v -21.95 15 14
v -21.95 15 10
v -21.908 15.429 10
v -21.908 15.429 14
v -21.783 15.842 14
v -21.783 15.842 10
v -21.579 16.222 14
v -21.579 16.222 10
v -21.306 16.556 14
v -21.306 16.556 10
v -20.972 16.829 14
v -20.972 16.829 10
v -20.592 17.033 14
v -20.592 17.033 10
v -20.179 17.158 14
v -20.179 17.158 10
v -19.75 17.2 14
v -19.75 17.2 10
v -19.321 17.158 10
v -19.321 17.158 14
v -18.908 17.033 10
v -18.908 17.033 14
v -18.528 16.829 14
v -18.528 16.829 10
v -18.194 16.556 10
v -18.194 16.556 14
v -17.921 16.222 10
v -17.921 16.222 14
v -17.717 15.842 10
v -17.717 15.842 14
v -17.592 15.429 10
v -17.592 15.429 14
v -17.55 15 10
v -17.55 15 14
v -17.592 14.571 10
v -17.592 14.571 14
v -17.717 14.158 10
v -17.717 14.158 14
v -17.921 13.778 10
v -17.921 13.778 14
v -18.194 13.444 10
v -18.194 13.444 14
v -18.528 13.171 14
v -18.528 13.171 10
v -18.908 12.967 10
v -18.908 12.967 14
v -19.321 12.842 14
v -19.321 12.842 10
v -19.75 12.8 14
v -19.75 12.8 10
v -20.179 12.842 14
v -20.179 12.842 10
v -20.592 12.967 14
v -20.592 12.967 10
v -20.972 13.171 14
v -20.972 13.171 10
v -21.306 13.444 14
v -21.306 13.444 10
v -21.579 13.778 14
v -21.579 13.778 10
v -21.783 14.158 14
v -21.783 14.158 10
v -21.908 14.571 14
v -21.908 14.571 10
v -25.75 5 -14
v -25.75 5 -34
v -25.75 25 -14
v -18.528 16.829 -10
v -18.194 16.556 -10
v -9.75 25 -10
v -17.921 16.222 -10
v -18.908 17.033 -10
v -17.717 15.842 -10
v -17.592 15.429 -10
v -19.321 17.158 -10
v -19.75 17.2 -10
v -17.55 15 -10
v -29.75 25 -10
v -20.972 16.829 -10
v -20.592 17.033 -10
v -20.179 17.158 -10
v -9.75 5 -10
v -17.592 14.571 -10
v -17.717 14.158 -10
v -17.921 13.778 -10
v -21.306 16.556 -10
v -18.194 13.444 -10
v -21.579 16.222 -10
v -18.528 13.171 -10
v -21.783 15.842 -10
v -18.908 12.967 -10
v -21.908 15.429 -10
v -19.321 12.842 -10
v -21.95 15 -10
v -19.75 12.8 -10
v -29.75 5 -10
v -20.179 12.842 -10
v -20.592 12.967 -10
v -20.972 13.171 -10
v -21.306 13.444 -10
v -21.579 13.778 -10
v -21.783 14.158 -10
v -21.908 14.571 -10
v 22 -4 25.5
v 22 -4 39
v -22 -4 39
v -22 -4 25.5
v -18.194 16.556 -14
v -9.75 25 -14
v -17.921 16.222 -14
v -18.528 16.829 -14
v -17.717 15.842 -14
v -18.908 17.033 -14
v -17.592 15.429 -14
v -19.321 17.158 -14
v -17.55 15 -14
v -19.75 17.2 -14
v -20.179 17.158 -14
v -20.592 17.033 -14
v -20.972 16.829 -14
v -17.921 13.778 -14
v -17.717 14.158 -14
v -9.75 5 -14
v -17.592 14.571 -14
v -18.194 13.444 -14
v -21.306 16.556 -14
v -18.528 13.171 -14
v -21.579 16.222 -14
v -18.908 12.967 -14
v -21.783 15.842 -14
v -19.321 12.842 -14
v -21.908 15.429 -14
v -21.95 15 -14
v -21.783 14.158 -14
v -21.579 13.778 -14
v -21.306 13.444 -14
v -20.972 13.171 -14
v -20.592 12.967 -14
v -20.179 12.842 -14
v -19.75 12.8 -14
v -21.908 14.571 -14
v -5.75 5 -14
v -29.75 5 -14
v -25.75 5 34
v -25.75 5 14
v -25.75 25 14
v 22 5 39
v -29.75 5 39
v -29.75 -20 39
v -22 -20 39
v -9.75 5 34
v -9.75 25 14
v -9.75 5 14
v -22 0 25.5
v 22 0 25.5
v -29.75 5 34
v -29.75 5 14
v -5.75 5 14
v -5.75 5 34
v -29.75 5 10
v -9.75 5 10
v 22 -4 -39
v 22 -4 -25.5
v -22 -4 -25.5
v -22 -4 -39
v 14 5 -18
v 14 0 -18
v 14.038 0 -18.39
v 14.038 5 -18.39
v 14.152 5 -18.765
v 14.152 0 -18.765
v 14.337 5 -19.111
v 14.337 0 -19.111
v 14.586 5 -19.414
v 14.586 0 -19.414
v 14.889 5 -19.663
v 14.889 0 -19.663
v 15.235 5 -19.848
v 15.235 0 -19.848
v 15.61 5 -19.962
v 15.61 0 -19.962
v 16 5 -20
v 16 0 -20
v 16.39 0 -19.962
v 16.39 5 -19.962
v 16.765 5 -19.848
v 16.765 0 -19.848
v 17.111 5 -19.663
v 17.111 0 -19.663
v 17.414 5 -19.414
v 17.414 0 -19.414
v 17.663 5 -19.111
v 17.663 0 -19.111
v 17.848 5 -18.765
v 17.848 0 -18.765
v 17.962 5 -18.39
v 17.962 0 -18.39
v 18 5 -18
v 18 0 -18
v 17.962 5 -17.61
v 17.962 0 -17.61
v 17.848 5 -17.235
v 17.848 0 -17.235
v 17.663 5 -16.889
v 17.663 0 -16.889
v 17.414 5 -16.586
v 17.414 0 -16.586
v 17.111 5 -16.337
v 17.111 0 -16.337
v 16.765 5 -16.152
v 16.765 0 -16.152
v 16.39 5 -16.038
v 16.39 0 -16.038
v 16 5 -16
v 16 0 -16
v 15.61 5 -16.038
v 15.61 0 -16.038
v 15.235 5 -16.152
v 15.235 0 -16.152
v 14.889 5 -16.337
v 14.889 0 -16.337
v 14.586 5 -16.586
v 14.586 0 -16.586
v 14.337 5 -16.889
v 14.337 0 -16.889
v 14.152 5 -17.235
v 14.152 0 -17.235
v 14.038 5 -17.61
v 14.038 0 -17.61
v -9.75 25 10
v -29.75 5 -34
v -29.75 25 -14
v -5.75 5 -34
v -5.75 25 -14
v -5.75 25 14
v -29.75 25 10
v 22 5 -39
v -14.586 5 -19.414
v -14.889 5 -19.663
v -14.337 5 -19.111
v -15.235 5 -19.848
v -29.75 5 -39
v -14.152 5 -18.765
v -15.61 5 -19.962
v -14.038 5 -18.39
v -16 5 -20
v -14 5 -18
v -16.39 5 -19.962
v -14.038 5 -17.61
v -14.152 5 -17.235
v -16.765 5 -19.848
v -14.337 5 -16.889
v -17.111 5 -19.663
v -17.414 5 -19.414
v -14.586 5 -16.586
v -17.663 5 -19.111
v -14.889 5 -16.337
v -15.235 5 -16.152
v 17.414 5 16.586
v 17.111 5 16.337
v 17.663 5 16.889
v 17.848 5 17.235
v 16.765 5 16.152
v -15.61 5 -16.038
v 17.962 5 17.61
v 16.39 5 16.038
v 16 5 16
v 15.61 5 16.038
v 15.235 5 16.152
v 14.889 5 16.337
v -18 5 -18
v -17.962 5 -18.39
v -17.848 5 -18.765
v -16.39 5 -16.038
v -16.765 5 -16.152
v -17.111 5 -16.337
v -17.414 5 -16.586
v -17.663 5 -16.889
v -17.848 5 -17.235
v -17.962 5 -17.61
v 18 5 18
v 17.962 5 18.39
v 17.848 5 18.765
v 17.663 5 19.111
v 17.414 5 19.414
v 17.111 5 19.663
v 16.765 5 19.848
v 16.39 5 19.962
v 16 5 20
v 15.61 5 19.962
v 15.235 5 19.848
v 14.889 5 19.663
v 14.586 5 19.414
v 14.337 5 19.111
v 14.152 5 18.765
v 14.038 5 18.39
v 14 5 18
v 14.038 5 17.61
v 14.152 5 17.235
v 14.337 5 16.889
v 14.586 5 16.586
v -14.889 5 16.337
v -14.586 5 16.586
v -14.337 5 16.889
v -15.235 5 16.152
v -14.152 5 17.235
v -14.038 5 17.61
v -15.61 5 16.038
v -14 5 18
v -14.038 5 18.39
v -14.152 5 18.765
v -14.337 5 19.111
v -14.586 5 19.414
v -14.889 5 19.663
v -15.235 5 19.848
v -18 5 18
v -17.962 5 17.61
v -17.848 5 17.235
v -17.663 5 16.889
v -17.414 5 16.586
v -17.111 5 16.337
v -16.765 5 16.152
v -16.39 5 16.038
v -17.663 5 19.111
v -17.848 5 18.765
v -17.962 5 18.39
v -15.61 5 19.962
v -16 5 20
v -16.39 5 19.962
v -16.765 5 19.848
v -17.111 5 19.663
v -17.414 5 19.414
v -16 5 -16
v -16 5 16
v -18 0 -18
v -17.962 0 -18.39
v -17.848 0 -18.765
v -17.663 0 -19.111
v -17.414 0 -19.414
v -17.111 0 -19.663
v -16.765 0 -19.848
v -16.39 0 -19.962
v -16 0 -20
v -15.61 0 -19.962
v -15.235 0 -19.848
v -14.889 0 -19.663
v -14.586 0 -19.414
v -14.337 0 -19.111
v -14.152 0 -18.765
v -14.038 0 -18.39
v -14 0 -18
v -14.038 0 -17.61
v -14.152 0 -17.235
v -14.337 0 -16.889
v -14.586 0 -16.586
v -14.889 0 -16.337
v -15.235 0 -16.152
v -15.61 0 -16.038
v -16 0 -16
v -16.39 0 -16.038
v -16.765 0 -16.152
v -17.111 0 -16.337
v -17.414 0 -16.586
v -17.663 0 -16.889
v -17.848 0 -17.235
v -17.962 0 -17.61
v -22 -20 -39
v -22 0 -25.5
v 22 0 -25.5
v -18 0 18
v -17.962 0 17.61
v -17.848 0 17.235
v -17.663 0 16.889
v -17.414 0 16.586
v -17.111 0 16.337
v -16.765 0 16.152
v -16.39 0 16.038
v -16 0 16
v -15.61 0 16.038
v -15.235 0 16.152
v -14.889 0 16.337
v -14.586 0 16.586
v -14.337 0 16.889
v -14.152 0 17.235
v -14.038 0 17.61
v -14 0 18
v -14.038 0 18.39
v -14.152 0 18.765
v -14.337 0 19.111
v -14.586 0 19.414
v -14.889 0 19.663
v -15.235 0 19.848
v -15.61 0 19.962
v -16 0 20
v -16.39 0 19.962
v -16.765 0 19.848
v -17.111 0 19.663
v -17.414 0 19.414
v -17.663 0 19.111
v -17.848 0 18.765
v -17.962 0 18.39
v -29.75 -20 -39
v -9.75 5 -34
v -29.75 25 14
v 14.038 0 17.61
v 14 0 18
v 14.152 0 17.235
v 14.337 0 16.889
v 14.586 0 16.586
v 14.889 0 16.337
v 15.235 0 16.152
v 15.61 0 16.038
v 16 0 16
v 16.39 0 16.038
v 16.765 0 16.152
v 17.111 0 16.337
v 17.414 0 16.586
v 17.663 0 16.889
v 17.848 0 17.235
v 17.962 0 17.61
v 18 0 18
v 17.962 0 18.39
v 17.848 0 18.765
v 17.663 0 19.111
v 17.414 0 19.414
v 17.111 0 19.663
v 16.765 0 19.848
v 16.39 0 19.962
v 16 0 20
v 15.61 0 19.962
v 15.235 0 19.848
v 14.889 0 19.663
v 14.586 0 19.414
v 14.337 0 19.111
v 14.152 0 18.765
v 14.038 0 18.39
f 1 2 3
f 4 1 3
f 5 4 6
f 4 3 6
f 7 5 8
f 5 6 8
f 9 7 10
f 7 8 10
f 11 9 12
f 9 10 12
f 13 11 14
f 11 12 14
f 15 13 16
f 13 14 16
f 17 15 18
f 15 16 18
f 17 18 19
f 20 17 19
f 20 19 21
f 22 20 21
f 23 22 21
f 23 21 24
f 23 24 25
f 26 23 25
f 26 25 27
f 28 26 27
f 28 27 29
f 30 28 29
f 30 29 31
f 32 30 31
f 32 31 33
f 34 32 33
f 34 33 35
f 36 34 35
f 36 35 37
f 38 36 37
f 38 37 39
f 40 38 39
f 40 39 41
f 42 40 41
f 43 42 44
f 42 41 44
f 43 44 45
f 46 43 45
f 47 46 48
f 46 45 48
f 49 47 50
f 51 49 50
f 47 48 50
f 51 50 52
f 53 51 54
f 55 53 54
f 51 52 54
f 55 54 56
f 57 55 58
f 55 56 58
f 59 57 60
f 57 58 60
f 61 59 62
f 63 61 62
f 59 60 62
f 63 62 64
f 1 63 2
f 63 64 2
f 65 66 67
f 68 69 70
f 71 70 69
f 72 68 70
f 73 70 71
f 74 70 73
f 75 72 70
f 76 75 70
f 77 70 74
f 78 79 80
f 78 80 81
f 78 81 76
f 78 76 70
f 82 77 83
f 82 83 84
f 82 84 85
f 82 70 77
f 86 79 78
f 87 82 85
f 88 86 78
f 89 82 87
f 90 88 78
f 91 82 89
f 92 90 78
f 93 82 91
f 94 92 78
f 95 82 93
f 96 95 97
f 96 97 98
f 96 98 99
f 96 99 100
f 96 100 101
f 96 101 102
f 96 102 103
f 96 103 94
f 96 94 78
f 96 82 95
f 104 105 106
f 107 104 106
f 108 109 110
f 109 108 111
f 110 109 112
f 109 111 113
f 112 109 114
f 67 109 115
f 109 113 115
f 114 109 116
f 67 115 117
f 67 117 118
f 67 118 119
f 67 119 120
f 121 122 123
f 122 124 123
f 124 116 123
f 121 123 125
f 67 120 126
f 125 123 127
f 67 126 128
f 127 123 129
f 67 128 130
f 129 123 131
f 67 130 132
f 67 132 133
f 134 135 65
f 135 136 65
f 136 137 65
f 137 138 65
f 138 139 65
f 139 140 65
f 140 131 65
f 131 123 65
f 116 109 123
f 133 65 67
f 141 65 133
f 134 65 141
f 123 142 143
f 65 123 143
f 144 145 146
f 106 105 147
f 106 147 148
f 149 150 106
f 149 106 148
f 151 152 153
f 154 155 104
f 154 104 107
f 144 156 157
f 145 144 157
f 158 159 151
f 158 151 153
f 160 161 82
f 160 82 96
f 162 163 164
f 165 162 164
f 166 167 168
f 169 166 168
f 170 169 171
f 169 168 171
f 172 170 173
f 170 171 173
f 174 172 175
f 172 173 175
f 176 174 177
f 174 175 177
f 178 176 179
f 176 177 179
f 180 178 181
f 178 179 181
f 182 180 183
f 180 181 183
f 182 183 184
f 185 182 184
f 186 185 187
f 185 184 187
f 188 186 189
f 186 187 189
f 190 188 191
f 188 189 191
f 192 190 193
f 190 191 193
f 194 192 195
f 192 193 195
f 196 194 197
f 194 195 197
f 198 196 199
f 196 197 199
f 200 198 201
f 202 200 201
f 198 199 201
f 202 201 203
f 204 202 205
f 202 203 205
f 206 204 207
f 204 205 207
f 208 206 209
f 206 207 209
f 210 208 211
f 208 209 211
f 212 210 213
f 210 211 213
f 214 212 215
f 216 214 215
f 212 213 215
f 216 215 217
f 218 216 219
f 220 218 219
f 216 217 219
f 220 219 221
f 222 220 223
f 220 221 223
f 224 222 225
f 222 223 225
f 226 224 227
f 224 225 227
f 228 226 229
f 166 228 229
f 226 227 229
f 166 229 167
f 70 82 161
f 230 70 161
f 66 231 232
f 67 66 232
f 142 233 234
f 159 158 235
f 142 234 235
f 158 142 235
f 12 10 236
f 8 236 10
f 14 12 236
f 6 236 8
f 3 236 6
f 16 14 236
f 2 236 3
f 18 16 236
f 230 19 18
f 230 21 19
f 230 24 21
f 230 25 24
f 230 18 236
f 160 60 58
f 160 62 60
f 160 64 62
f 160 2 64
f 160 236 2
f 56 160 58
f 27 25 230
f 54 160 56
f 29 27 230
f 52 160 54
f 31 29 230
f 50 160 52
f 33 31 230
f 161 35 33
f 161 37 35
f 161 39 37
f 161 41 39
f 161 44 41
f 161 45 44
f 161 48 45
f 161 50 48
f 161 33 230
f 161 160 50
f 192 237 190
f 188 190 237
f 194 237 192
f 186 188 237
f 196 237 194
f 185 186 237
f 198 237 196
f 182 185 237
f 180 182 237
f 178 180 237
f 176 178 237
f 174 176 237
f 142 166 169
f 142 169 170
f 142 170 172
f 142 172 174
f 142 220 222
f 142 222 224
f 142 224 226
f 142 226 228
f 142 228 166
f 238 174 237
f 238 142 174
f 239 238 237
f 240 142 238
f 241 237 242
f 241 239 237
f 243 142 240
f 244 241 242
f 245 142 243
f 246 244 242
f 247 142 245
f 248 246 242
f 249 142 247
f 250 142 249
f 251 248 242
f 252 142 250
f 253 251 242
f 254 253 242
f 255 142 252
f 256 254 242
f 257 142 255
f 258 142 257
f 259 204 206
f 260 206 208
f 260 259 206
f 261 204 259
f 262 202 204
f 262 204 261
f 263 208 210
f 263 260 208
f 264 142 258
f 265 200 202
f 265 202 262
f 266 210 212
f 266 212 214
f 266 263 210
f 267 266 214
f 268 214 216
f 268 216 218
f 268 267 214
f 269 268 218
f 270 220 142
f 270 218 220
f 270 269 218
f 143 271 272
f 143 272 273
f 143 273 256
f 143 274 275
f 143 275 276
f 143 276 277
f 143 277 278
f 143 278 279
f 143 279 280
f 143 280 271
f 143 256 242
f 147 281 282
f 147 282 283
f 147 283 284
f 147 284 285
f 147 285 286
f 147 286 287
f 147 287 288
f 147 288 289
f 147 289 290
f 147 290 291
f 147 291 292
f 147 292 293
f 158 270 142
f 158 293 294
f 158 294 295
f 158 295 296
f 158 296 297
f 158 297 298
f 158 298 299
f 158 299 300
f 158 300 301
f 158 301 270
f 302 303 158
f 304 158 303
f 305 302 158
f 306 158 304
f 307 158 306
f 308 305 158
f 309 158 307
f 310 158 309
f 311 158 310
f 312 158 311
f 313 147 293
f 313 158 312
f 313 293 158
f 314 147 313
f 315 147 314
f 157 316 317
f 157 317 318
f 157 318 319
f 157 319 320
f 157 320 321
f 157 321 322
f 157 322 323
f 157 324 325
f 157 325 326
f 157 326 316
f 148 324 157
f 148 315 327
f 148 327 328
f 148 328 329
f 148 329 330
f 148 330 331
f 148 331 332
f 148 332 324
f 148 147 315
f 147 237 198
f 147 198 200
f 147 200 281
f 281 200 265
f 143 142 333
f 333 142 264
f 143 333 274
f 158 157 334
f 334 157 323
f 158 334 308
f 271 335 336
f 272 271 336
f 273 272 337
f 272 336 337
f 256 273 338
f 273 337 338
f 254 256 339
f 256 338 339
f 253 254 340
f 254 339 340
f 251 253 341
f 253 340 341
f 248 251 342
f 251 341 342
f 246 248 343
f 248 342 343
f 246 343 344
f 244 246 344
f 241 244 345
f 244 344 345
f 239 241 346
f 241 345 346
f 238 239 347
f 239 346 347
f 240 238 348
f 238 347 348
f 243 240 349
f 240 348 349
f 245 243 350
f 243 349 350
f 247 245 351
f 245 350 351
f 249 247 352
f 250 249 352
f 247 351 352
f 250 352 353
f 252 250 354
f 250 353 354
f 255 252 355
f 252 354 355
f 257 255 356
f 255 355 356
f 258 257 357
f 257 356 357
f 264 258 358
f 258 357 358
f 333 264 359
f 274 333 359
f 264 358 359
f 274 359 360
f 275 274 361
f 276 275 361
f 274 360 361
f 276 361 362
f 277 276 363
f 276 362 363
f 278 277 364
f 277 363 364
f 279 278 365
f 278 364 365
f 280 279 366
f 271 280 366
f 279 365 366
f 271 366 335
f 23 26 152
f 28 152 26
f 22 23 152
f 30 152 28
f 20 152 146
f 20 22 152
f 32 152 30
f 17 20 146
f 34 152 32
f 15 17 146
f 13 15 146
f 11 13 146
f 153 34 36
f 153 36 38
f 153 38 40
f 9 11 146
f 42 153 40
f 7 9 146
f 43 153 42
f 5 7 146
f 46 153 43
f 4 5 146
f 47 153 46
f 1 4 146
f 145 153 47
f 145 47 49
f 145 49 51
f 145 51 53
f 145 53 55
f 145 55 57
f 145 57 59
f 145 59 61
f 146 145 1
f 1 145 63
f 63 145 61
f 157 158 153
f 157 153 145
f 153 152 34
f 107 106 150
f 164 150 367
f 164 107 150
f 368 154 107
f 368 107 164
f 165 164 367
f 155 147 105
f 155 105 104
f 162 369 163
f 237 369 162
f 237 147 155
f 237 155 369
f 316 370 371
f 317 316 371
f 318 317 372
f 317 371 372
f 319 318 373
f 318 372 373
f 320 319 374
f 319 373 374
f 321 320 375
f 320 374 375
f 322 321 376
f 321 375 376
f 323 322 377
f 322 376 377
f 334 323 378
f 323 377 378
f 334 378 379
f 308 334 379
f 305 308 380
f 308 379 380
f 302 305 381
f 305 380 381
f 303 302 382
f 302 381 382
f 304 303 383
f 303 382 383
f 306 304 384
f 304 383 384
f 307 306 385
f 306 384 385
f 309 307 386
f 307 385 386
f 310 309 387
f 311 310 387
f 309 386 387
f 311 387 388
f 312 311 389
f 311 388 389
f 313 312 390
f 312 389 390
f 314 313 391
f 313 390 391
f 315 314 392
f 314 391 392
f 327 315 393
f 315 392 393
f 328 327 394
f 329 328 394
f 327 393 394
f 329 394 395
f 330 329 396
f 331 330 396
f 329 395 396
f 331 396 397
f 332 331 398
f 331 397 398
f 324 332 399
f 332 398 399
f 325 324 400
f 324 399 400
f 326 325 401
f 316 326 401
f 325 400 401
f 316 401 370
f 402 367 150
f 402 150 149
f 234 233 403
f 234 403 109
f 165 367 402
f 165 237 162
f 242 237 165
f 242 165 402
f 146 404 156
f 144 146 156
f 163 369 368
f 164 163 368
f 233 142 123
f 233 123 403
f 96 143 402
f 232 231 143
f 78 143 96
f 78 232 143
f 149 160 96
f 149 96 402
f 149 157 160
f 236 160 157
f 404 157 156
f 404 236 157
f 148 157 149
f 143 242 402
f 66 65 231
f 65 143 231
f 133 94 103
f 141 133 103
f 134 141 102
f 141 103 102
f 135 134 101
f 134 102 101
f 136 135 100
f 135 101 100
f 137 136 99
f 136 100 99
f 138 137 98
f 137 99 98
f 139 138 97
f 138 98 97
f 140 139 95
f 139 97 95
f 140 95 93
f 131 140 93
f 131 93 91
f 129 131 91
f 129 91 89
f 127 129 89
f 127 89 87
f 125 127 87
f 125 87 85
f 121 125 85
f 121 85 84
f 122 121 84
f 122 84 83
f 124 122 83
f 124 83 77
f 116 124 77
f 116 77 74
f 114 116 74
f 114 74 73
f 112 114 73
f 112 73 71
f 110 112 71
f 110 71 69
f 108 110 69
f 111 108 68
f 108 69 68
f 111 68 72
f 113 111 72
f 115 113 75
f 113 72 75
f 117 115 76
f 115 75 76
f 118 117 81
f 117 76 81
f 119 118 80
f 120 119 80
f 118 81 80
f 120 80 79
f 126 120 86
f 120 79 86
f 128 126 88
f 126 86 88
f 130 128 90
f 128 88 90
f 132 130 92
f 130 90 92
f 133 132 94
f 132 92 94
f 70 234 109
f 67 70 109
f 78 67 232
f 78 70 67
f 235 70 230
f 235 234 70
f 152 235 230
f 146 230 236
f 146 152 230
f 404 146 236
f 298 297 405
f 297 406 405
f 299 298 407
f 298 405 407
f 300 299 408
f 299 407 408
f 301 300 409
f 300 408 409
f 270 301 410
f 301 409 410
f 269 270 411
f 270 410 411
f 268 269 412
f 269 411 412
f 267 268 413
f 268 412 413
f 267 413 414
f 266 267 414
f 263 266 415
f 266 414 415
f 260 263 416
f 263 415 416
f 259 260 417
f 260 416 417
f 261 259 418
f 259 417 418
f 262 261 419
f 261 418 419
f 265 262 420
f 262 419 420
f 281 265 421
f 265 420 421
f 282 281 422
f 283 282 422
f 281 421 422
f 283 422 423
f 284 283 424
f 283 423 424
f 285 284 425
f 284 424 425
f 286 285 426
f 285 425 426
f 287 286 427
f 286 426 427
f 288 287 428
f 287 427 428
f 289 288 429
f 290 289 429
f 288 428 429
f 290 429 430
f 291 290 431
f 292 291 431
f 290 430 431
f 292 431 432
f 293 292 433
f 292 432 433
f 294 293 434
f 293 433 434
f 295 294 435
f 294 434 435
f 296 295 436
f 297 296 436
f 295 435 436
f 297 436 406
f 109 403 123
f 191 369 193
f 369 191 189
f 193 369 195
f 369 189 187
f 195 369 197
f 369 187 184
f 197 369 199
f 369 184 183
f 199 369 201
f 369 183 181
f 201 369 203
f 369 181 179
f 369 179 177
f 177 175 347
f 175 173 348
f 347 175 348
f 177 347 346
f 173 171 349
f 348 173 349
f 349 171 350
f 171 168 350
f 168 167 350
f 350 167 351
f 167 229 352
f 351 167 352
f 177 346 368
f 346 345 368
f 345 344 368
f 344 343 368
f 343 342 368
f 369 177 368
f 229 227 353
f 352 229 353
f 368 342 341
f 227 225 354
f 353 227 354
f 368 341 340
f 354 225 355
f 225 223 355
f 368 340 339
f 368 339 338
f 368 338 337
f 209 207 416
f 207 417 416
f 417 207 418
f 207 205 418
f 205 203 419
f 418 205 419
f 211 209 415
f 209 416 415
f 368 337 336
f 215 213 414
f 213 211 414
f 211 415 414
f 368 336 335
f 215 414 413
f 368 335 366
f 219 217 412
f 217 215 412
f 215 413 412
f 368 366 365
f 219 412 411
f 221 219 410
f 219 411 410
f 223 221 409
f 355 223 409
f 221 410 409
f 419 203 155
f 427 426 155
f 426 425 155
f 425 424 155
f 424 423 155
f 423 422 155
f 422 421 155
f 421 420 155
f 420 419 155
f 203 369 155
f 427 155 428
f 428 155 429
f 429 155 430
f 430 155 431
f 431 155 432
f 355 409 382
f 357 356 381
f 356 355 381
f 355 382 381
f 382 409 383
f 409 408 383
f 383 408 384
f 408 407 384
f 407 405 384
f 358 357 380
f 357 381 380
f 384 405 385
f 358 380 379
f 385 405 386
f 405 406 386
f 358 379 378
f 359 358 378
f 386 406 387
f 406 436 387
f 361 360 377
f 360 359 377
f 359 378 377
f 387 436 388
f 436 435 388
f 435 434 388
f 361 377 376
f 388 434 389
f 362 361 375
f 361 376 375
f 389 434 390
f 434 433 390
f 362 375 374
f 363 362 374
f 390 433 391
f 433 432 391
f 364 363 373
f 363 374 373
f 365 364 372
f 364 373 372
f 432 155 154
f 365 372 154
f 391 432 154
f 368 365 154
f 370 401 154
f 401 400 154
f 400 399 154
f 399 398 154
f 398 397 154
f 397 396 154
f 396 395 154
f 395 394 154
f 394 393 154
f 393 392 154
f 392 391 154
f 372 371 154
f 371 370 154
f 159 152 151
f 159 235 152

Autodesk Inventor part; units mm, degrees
ref_plane "YZ Plane" through (0, 0, 0) normal (1, 0, 0) x (0, 1, 0)
ref_plane "XY Plane" through (0, 0, 0) normal (0, 0, 1) x (1, 0, 0)
sketch "Sketch1" plane through (0, 0, 0) normal (0, 1, 0) x (-1, 0, 0)
  line L0 (16, 18) -> (16, -18) construction
  circle A0 centre (16, -18) radius 2
  line L1 (16, 0) -> (0, 0) construction
  line L2 (-16, 0) -> (0, 0) construction
  line L3 (-16, 18) -> (-16, -18) construction
  circle A1 centre (-16, 18) radius 2
  circle A2 centre (-16, -18) radius 2
  line L4 (22, -25.5) -> (-22, -25.5) construction
  line L5 (-22, -25.5) -> (22, -25.5)
  line L6 (-22, -25.5) -> (-22, 25.5)
  line L7 (22, -25.5) -> (-22, 25.5) construction
  line L8 (-22, -25.5) -> (22, 25.5) construction
  circle A3 centre (16, 18) radius 2
  line L9 (-22, 25.5) -> (22, 25.5) construction
  line L10 (-22, 25.5) -> (22, 25.5)
  circle A4 centre (16, -18) radius 4
  circle A5 centre (-16, -18) radius 4
  circle A6 centre (-16, 18) radius 4
  circle A7 centre (16, 18) radius 4
  line L11 (22, -25.5) -> (-22, -25.5)
  line L12 (-22, -25.5) -> (-22, -39)
  line L13 (-22, -39) -> (22, -39)
  line L14 (22, -39) -> (22, -25.5)
  line L15 (22, 25.5) -> (-22, 25.5)
  line L16 (-22, 25.5) -> (-22, 39)
  line L17 (-22, 39) -> (22, 39)
  line L18 (22, 39) -> (22, 25.5)
  line L19 (22, 0) -> (9.75, 0) construction
  line L20 (9.75, 0) -> (9.75, 10) construction
  line L21 (9.75, 0) -> (9.75, -10) construction
  line L22 (29.75, 10) -> (9.75, 10)
  line L23 (9.75, 10) -> (9.75, 14)
  line L24 (9.75, 14) -> (29.75, 14)
  line L25 (9.75, -10) -> (29.75, -10)
  line L26 (9.75, -10) -> (9.75, -14)
  line L27 (9.75, -14) -> (29.75, -14)
  line L28 (9.75, 10) -> (5.75, 10)
  line L29 (5.75, 10) -> (5.75, -10)
  line L30 (5.75, -10) -> (9.75, -10)
  line L31 (9.75, -10) -> (9.75, 10)
  line L32 (9.75, 14) -> (5.75, 14)
  line L33 (5.75, 14) -> (5.75, 10)
  line L34 (5.75, -10) -> (5.75, -14)
  line L35 (5.75, -14) -> (9.75, -14)
  line L36 (22, 0) -> (16, 0) construction
  line L37 (34.75, 46.236) -> (34.75, -49.0008) construction
  line L38 (22, 39) -> (29.75, 39)
  line L39 (29.75, 39) -> (29.75, -39)
  line L40 (29.75, -39) -> (22, -39)
  line L41 (22, 25.5) -> (22, -25.5)
  point P0 (9.75, -10)
  point P1 (9.75, 0)
  dimension "d0" = 36
  dimension "d1" = 4
  dimension "d2" = 4
  dimension "d3" = 36
  dimension "d4" = 4
  dimension "d5" = 4
  dimension "d6" = 32
  dimension "d7" = 51
  dimension "d8" = 44
  dimension "d9" = 2
  dimension "d10" = 2
  dimension "d11" = 2
  dimension "d12" = 2
  dimension "d13" = 13.5
  dimension "d14" = 13.5
  dimension "d19" = 4
  dimension "d20" = 20
  dimension "d75" = 9.75
  dimension "d79" = 20
  dimension "d80" = 34.75
extrude "Extrusion1" add sketch "Sketch1" against normal blind 4 contours L5 L14 L13 L12 | L16 L17 L18 L10
extrude "Extrusion2" add sketch "Sketch1" along normal blind 5 contours A0 | A1 | A2 | A4 | A7 | L6 L10 L41 L24 L32 L33 L29 L34 L35 L27 L5 | L5 L14 L13 L12 | L41 L27 L39 L40 L14 | L16 L17 L18 L10 | L41 L25 L39 L27 | L27 L26 L25 L41 | L18 L38 L39 L24 L41 | L41 L22 L39 L25 | L25 L31 L22 L41 | L41 L22 L23 L24 | L24 L39 L22 L41 | L35 L34 L30 L26 | L30 L29 L28 L31 | L28 L33 L32 L23 | A3 | A5 | A6
extrude "Extrusion14" add sketch "Sketch1" against normal blind 20 contours L41 L27 L39 L40 L14 | L41 L25 L39 L27 | L18 L38 L39 L24 L41 | L41 L22 L39 L25 | L24 L39 L22 L41
extrude "Extrusion3" add sketch "Sketch1" along normal blind 20 from surface at 5 contours L41 L25 L39 L27 | L27 L26 L25 L41 | L41 L22 L23 L24 | L24 L39 L22 L41 | L35 L34 L30 L26 | L30 L29 L28 L31 | L28 L33 L32 L23
extrude "Extrusion4" cut sketch "Sketch1" along normal through all contours A0 | A1 | A2 | A3
sketch "Sketch3" plane through (-9.75, 5, 10) normal (0, 0, -1) x (-1, 0, 0)
  circle A0 centre (10, 10) radius 2.2
  circle A1 centre (10, 10) radius 4.2
  line L0 (20, 0) -> (20, 20) projected
  line L1 (0, 0) -> (20, 0) projected
  dimension "d63" = 4.4
  dimension "d64" = 2
  dimension "d94" = 10
  dimension "d101" = 10
sketch "Sketch4" plane through (-29.75, -20, -39) normal (-1, 0, 0) x (0, 0, 1)
  line L0 (53, 45) -> (72.9998, 25.0002)
  line L1 (53, 45) -> (81.284, 45) construction
  line L2 (72.9998, 25.0002) -> (53, 25.0002)
  line L3 (53, 25.0002) -> (53, 45)
  point P0 (39, 20)
  dimension "d95" = 28.284
  dimension "d96" = 45
extrude "Extrusion15" cut sketch "Sketch3" against normal through all contours A0
extrude "Extrusion16" add sketch "Sketch4" against normal blind 4
extrude "Extrusion17" add sketch "Sketch4" along normal blind 4 from surface at -24
mirror "Mirror1" about plane through (0, 0, 0) normal (0, 0, 1) of "Extrusion16", "Extrusion17", "Extrusion15"
equation "\"d2\" = d1"
equation "\"d4\" = d1"
equation "\"d5\" = d1"
equation "\"d10\" = d9"
equation "\"d11\" = d9"
equation "\"d12\" = d9"
equation "\"d14\" = d13"
properties part number "XY Rail Bracket"
